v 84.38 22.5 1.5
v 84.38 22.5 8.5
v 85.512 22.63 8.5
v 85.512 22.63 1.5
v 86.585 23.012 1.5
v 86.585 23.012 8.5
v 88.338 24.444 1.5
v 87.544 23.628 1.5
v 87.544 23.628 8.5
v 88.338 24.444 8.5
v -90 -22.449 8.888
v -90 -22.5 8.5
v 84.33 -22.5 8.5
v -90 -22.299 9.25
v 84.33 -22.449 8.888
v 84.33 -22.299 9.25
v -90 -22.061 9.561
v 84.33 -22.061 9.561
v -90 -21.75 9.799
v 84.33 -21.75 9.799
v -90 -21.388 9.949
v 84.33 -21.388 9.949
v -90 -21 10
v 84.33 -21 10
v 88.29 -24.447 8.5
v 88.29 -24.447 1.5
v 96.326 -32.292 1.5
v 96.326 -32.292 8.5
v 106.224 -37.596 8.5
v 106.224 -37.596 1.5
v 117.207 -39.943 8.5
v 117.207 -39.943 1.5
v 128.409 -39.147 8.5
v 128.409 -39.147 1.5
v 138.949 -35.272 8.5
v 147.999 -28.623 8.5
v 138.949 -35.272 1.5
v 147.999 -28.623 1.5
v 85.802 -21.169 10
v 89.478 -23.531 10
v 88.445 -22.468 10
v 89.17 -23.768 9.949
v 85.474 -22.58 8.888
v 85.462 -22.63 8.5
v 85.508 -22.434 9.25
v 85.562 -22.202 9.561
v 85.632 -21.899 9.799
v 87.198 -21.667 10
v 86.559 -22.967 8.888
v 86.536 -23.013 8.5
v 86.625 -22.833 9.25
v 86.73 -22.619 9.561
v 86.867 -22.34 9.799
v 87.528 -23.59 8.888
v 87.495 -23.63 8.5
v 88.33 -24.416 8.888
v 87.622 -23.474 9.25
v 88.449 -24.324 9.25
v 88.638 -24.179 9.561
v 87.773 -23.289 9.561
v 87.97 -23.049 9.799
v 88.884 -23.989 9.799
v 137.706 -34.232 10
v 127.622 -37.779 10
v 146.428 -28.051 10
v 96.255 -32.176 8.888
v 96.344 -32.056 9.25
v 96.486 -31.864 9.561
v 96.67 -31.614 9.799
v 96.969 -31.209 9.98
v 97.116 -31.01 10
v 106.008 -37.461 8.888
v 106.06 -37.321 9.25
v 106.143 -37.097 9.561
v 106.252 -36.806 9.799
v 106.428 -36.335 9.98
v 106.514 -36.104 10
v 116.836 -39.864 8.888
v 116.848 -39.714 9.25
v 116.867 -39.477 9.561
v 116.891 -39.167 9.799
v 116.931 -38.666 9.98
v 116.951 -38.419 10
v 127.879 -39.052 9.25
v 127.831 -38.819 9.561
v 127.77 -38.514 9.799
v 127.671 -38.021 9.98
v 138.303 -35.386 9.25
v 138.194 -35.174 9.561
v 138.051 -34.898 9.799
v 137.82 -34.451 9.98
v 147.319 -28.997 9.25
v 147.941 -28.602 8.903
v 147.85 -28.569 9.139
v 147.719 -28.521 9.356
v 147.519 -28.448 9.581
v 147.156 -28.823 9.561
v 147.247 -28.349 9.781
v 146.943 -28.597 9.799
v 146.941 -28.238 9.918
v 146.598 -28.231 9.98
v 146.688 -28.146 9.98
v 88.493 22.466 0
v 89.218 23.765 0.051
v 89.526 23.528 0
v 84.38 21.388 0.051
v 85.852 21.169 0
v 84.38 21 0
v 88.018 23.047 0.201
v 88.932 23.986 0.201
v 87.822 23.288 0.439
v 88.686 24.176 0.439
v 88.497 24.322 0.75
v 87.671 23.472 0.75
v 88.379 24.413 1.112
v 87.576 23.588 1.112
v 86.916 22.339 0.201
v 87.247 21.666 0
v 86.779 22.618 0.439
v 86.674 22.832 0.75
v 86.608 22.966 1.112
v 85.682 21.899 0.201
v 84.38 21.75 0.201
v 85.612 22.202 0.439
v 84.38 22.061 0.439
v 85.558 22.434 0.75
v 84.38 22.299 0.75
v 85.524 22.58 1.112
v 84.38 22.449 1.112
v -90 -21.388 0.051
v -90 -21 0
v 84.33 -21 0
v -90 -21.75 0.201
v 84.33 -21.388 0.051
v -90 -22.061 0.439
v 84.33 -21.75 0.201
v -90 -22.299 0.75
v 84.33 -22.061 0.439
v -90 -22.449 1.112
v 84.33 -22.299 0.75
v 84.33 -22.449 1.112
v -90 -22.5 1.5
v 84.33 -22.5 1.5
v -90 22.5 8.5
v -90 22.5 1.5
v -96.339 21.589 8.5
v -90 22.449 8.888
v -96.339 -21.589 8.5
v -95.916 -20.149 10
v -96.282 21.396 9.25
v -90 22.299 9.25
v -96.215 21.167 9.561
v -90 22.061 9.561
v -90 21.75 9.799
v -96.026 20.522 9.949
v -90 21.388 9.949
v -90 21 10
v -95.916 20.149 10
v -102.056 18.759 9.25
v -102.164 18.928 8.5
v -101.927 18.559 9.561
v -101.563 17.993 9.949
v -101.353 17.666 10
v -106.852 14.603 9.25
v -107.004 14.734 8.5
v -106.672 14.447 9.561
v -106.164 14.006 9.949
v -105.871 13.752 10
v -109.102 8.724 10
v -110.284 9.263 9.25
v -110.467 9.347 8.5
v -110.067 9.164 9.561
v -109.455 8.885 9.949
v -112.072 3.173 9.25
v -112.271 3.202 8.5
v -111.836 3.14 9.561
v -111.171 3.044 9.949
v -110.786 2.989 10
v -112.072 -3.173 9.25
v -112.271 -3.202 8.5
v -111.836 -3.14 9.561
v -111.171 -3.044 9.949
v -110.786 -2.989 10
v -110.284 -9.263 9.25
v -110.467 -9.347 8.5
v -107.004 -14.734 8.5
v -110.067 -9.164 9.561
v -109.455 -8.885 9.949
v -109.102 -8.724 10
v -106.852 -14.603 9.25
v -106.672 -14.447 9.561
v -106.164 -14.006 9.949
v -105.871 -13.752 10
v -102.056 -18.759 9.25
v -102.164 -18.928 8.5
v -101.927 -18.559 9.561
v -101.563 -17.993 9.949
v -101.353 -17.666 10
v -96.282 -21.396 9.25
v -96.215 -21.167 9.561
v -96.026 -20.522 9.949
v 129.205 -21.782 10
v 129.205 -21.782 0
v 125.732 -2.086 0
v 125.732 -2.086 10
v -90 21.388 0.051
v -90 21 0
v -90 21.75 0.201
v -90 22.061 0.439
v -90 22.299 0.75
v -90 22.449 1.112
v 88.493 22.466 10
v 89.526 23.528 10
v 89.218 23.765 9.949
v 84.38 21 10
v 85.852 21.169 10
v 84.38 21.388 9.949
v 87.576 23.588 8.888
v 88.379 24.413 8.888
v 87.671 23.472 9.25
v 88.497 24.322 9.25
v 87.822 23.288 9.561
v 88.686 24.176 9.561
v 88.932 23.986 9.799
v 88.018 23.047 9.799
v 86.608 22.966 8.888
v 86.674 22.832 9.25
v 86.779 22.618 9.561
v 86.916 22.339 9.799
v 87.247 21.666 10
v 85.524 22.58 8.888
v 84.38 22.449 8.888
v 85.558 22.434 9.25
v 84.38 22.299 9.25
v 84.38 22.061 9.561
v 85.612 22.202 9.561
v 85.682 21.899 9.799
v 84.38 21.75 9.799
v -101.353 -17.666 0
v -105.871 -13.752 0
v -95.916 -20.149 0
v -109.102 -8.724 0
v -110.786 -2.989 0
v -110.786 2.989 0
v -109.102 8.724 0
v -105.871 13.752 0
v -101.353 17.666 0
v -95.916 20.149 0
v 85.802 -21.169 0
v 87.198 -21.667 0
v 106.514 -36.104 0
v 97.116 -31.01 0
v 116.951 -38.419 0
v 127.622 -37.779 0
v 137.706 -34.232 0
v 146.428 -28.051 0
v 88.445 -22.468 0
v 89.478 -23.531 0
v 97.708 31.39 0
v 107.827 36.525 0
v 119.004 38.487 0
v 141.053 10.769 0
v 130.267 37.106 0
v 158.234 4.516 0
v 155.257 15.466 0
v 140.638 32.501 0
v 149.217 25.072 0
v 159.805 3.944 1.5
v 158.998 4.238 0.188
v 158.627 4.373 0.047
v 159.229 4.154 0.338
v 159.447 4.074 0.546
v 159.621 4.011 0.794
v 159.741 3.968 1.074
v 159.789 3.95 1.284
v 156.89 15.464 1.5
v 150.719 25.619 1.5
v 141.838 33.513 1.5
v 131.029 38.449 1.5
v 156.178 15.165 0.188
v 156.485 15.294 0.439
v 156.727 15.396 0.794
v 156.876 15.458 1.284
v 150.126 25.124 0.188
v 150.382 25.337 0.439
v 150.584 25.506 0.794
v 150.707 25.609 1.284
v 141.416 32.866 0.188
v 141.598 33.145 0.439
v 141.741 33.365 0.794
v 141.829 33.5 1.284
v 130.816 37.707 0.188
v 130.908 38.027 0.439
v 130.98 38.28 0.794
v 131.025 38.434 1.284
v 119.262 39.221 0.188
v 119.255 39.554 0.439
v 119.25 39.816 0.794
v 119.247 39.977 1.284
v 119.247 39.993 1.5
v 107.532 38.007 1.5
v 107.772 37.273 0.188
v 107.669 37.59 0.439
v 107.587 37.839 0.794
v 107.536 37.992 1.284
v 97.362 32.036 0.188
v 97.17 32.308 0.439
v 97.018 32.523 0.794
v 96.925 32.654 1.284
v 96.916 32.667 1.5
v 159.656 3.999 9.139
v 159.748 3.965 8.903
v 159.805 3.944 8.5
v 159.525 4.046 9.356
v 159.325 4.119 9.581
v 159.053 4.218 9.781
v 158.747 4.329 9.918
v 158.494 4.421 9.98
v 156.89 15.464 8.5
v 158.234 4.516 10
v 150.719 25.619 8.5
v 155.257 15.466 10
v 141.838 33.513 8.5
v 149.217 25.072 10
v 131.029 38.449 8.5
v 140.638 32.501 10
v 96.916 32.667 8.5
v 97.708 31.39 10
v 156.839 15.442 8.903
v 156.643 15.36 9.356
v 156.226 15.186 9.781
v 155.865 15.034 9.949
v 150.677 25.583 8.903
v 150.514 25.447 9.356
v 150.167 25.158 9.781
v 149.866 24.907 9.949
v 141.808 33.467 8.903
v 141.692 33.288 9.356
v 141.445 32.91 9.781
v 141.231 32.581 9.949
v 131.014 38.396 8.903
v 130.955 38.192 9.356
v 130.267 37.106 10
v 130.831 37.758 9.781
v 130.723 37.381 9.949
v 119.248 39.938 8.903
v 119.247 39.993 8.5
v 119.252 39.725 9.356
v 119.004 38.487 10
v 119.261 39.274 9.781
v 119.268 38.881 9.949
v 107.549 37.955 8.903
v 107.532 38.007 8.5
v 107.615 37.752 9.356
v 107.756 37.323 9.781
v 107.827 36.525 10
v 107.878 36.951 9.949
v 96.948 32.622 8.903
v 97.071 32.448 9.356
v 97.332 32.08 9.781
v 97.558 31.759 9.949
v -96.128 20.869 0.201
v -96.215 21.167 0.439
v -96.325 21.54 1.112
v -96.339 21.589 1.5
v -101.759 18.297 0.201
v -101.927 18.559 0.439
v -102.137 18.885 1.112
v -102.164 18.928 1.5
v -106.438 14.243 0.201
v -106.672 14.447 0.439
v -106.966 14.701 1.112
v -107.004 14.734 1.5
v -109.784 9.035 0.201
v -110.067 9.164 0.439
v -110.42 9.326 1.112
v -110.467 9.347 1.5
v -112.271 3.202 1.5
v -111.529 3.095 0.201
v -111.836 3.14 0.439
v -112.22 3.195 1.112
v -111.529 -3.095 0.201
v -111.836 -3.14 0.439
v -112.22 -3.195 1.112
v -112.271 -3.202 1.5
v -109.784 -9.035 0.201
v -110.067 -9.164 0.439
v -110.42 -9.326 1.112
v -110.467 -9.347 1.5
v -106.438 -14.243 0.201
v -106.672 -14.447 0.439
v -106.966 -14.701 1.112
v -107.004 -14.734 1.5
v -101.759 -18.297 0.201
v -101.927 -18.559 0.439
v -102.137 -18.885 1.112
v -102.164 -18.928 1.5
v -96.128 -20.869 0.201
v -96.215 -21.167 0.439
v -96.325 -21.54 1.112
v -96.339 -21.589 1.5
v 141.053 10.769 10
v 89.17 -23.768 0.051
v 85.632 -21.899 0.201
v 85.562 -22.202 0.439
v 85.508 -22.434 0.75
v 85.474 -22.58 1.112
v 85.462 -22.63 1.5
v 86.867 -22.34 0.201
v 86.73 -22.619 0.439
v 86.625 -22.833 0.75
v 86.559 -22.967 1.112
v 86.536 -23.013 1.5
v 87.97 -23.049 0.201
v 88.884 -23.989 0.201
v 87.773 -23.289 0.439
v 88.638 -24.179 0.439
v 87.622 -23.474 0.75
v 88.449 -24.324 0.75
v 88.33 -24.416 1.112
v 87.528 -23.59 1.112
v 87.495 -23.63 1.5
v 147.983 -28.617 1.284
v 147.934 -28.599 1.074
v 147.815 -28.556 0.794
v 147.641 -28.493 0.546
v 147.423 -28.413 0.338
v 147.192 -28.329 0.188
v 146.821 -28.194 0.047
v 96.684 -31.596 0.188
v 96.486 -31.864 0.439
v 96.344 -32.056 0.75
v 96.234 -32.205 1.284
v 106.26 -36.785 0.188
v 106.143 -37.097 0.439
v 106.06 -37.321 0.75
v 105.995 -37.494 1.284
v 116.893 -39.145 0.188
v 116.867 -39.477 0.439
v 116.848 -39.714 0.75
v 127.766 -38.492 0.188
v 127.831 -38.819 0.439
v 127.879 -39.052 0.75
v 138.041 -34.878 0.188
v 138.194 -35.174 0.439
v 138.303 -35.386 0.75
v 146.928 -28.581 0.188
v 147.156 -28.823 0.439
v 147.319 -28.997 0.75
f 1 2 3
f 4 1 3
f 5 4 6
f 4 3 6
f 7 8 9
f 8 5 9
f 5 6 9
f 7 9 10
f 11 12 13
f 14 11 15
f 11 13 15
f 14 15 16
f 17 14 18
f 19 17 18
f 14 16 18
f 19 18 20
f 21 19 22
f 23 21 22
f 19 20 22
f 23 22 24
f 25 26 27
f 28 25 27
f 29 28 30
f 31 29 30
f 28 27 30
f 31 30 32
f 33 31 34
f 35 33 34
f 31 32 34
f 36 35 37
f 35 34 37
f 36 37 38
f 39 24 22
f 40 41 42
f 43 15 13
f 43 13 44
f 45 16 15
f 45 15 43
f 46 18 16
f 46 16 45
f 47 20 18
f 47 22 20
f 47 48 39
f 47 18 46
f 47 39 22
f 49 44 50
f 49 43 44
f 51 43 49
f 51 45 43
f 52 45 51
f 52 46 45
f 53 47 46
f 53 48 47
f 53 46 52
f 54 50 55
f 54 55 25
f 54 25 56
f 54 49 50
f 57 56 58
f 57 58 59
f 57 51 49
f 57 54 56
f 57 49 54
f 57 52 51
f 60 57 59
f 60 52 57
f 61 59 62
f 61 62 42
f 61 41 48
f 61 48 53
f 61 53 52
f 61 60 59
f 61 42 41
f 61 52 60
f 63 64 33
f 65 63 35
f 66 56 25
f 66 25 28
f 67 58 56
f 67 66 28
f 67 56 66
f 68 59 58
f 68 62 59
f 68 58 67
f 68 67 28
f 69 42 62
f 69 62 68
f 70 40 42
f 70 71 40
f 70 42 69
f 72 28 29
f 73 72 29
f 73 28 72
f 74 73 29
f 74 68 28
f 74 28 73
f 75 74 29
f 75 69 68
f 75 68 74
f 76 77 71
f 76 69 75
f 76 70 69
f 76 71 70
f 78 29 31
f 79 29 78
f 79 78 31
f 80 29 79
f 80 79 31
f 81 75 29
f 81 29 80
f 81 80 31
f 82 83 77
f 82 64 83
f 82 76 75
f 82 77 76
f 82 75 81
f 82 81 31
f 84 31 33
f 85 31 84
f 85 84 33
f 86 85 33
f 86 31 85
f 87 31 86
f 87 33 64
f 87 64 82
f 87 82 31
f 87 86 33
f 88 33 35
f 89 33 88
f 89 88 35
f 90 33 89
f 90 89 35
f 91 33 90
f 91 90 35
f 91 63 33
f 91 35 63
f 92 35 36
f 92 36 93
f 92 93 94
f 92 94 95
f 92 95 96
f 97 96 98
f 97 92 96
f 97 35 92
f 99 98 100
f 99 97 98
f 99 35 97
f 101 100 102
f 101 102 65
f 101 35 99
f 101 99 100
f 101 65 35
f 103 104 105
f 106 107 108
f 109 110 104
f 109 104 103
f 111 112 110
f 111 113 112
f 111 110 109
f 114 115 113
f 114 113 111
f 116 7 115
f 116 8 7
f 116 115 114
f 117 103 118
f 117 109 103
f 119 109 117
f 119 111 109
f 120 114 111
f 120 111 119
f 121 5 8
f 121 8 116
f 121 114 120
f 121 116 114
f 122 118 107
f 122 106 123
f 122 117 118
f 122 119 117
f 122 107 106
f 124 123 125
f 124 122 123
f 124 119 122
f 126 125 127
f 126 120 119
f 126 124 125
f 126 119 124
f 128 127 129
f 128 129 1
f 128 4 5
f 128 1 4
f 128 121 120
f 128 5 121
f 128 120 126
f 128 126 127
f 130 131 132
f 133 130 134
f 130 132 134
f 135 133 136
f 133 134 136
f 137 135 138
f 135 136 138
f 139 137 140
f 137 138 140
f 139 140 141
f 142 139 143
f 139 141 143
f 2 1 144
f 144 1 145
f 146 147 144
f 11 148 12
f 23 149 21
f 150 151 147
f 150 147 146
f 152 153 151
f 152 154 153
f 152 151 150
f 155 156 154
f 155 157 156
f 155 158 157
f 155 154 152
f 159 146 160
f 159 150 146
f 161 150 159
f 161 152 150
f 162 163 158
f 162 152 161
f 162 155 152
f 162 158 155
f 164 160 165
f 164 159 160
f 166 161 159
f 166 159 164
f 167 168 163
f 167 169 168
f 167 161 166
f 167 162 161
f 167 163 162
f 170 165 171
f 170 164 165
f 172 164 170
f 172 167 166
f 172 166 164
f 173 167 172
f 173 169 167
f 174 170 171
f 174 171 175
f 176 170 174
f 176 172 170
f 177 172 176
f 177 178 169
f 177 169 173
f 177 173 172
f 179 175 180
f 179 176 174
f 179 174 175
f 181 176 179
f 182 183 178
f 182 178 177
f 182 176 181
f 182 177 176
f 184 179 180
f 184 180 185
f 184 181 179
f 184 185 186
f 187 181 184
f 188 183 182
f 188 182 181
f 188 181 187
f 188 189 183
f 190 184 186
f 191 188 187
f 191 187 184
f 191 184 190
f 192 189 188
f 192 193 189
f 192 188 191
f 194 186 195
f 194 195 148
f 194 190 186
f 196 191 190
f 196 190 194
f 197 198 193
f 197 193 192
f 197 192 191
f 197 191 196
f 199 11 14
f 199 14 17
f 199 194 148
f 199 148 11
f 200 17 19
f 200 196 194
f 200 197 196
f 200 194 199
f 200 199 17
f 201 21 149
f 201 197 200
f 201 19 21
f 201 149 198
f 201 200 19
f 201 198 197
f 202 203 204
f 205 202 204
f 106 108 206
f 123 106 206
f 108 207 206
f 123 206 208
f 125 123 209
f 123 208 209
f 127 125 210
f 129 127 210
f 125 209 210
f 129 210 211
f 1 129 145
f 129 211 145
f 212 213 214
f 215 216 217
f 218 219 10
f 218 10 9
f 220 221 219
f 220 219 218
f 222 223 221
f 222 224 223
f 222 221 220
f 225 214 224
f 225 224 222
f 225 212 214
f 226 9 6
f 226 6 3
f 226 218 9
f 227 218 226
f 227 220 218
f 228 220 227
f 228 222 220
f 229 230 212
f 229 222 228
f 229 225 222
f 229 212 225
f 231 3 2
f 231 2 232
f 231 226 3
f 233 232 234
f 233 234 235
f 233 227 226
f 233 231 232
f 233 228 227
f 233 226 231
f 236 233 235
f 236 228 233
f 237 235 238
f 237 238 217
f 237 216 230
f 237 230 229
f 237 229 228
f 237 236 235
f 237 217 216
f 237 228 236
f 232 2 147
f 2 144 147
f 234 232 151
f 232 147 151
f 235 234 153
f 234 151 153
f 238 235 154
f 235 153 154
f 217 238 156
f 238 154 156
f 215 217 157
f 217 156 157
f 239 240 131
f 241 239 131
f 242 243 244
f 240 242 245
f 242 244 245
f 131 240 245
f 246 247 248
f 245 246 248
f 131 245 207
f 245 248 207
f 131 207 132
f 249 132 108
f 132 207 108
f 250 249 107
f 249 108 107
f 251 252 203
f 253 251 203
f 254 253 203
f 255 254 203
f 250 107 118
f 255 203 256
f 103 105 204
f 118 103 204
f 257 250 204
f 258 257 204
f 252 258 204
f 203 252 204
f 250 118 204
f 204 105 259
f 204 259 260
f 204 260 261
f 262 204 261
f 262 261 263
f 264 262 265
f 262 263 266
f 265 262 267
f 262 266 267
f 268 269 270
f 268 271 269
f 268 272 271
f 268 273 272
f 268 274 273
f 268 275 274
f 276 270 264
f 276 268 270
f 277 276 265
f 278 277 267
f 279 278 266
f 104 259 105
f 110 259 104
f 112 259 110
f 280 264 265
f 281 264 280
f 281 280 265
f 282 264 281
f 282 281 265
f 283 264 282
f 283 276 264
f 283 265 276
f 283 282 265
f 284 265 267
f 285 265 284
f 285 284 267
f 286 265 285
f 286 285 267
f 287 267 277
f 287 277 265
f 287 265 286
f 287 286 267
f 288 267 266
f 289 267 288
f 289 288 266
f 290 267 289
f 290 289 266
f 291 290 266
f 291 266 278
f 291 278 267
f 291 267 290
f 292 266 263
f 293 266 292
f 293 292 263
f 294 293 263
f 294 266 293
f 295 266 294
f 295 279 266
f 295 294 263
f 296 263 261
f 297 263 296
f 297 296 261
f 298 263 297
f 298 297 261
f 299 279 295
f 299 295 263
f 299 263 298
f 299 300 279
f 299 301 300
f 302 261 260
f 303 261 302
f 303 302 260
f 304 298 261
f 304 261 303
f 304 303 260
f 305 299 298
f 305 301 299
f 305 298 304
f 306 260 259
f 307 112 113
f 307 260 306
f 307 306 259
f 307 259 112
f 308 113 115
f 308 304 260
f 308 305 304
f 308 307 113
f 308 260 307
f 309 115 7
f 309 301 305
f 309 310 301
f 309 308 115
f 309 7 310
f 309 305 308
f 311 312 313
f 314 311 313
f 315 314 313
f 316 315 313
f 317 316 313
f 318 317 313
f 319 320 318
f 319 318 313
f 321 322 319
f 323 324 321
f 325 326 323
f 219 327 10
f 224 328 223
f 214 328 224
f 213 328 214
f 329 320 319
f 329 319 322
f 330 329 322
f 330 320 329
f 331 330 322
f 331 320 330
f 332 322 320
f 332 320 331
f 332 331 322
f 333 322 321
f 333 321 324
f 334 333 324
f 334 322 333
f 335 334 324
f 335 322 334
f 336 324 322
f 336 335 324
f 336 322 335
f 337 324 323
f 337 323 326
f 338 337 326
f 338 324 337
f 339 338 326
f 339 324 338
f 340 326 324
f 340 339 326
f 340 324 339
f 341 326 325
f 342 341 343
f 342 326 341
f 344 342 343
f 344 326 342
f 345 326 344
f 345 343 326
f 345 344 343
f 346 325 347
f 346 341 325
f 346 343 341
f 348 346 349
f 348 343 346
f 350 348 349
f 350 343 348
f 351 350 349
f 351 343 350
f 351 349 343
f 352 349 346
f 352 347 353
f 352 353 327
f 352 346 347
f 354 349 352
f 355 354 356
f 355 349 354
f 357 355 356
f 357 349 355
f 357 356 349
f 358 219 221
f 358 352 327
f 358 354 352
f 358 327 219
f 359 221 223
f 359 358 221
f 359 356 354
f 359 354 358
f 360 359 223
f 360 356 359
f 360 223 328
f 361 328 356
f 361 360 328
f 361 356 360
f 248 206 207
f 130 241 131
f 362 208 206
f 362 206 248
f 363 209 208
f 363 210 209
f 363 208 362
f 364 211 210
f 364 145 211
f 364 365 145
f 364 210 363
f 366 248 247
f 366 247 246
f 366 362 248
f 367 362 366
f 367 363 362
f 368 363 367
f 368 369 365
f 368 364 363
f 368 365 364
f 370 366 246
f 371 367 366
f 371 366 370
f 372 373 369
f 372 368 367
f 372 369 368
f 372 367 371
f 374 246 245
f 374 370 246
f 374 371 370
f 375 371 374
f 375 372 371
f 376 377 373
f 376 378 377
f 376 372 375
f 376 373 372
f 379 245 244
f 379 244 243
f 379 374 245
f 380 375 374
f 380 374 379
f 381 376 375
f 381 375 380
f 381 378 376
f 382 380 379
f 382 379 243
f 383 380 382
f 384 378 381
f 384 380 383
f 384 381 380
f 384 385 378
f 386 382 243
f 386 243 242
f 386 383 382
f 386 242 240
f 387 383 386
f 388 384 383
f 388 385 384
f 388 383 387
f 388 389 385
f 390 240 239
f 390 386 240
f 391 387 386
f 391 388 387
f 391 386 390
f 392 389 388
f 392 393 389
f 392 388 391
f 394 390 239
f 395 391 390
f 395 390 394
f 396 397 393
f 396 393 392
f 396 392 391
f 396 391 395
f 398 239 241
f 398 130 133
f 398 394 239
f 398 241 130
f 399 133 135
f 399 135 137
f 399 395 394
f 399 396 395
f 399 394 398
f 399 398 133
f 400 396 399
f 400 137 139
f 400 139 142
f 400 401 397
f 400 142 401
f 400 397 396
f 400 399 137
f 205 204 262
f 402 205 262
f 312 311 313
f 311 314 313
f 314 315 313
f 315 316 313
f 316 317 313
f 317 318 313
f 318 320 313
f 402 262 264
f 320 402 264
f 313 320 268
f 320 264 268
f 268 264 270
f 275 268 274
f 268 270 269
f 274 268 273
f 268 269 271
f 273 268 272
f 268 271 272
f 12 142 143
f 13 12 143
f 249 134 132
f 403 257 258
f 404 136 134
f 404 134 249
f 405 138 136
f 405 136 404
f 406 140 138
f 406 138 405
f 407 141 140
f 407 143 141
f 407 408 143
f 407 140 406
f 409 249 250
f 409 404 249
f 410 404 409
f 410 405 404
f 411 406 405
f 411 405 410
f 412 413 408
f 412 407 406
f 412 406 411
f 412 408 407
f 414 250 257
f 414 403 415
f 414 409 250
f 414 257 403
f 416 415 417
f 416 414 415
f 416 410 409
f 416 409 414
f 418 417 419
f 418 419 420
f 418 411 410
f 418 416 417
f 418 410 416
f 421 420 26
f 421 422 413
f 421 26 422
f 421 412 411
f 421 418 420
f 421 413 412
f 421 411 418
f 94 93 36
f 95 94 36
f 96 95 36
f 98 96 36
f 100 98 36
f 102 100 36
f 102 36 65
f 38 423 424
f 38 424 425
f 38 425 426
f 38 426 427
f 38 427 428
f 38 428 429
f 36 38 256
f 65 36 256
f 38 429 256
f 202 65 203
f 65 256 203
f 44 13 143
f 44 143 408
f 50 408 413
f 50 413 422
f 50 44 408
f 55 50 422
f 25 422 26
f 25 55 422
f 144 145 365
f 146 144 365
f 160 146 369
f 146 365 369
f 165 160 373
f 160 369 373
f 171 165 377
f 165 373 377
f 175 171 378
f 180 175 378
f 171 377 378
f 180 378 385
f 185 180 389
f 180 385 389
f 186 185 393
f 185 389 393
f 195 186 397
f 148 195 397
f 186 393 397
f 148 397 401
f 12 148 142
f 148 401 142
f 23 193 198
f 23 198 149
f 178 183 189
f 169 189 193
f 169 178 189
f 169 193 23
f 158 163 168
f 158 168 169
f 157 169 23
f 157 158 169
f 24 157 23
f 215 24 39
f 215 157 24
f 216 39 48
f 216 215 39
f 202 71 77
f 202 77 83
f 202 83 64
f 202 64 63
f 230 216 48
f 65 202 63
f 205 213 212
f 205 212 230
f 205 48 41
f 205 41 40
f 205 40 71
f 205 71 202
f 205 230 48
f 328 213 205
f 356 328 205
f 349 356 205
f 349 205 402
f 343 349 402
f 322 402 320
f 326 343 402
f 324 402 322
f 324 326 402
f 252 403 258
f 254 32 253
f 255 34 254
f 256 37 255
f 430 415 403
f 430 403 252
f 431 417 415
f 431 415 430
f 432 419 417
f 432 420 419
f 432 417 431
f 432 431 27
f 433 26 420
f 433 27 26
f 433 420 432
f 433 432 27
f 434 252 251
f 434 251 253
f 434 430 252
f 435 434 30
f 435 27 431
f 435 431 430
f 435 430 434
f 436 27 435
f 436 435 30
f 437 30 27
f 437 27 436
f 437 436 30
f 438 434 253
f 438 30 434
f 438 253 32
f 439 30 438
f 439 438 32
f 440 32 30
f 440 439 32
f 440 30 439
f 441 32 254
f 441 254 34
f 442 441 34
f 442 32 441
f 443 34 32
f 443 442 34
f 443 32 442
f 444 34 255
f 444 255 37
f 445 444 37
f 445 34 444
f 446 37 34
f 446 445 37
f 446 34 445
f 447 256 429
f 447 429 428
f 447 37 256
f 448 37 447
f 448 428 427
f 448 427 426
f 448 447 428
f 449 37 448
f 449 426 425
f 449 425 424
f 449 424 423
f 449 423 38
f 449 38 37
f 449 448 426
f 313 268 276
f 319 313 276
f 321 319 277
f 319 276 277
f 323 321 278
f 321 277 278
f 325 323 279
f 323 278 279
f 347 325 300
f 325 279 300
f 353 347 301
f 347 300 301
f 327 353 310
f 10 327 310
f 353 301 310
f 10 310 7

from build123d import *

# Parameters (mm, degrees)
F1_DEPTH = 10
F2_R     = 5
F3_R     = 1.5


with BuildPart() as f1:
    # F0 (on Top) → F1 (new body)
    with BuildSketch(Plane.XY):
        with BuildLine():
            Line((86.928109, 22.5), (-90, 22.5))
            ThreePointArc((-90, 22.5), (-112.5, 0), (-90, -22.5))
            Line((-90, -22.5), (86.879614, -22.5))
            ThreePointArc((86.879614, -22.5), (116.008795, -39.840686), (147.998941, -28.622881))
            Line((147.998941, -28.622881), (129.205089, -21.782478))
            Line((129.205089, -21.782478), (125.732125, -2.086323))
            Line((125.732125, -2.086323), (141.053014, 10.769429))
            Line((141.053014, 10.769429), (159.805062, 3.944242))
            ThreePointArc((159.805062, 3.944242), (129.869799, 38.763218), (86.928109, 22.5))
        make_face()
    extrude(amount=F1_DEPTH)

    # F2
    f2_edges = [f1.edges().sort_by_distance(p)[0] for p in [
        (86.928109, 22.5, 5),
        (86.879614, -22.5, 5),
    ]]
    fillet(f2_edges, radius=F2_R)

    # F3
    f3_edges = [f1.edges().sort_by_distance(p)[0] for p in [
        (-2.809759, 22.5, 10),
        (-2.835085, -22.5, 0),
    ]]
    fillet(f3_edges, radius=F3_R)


solid = f1.part
